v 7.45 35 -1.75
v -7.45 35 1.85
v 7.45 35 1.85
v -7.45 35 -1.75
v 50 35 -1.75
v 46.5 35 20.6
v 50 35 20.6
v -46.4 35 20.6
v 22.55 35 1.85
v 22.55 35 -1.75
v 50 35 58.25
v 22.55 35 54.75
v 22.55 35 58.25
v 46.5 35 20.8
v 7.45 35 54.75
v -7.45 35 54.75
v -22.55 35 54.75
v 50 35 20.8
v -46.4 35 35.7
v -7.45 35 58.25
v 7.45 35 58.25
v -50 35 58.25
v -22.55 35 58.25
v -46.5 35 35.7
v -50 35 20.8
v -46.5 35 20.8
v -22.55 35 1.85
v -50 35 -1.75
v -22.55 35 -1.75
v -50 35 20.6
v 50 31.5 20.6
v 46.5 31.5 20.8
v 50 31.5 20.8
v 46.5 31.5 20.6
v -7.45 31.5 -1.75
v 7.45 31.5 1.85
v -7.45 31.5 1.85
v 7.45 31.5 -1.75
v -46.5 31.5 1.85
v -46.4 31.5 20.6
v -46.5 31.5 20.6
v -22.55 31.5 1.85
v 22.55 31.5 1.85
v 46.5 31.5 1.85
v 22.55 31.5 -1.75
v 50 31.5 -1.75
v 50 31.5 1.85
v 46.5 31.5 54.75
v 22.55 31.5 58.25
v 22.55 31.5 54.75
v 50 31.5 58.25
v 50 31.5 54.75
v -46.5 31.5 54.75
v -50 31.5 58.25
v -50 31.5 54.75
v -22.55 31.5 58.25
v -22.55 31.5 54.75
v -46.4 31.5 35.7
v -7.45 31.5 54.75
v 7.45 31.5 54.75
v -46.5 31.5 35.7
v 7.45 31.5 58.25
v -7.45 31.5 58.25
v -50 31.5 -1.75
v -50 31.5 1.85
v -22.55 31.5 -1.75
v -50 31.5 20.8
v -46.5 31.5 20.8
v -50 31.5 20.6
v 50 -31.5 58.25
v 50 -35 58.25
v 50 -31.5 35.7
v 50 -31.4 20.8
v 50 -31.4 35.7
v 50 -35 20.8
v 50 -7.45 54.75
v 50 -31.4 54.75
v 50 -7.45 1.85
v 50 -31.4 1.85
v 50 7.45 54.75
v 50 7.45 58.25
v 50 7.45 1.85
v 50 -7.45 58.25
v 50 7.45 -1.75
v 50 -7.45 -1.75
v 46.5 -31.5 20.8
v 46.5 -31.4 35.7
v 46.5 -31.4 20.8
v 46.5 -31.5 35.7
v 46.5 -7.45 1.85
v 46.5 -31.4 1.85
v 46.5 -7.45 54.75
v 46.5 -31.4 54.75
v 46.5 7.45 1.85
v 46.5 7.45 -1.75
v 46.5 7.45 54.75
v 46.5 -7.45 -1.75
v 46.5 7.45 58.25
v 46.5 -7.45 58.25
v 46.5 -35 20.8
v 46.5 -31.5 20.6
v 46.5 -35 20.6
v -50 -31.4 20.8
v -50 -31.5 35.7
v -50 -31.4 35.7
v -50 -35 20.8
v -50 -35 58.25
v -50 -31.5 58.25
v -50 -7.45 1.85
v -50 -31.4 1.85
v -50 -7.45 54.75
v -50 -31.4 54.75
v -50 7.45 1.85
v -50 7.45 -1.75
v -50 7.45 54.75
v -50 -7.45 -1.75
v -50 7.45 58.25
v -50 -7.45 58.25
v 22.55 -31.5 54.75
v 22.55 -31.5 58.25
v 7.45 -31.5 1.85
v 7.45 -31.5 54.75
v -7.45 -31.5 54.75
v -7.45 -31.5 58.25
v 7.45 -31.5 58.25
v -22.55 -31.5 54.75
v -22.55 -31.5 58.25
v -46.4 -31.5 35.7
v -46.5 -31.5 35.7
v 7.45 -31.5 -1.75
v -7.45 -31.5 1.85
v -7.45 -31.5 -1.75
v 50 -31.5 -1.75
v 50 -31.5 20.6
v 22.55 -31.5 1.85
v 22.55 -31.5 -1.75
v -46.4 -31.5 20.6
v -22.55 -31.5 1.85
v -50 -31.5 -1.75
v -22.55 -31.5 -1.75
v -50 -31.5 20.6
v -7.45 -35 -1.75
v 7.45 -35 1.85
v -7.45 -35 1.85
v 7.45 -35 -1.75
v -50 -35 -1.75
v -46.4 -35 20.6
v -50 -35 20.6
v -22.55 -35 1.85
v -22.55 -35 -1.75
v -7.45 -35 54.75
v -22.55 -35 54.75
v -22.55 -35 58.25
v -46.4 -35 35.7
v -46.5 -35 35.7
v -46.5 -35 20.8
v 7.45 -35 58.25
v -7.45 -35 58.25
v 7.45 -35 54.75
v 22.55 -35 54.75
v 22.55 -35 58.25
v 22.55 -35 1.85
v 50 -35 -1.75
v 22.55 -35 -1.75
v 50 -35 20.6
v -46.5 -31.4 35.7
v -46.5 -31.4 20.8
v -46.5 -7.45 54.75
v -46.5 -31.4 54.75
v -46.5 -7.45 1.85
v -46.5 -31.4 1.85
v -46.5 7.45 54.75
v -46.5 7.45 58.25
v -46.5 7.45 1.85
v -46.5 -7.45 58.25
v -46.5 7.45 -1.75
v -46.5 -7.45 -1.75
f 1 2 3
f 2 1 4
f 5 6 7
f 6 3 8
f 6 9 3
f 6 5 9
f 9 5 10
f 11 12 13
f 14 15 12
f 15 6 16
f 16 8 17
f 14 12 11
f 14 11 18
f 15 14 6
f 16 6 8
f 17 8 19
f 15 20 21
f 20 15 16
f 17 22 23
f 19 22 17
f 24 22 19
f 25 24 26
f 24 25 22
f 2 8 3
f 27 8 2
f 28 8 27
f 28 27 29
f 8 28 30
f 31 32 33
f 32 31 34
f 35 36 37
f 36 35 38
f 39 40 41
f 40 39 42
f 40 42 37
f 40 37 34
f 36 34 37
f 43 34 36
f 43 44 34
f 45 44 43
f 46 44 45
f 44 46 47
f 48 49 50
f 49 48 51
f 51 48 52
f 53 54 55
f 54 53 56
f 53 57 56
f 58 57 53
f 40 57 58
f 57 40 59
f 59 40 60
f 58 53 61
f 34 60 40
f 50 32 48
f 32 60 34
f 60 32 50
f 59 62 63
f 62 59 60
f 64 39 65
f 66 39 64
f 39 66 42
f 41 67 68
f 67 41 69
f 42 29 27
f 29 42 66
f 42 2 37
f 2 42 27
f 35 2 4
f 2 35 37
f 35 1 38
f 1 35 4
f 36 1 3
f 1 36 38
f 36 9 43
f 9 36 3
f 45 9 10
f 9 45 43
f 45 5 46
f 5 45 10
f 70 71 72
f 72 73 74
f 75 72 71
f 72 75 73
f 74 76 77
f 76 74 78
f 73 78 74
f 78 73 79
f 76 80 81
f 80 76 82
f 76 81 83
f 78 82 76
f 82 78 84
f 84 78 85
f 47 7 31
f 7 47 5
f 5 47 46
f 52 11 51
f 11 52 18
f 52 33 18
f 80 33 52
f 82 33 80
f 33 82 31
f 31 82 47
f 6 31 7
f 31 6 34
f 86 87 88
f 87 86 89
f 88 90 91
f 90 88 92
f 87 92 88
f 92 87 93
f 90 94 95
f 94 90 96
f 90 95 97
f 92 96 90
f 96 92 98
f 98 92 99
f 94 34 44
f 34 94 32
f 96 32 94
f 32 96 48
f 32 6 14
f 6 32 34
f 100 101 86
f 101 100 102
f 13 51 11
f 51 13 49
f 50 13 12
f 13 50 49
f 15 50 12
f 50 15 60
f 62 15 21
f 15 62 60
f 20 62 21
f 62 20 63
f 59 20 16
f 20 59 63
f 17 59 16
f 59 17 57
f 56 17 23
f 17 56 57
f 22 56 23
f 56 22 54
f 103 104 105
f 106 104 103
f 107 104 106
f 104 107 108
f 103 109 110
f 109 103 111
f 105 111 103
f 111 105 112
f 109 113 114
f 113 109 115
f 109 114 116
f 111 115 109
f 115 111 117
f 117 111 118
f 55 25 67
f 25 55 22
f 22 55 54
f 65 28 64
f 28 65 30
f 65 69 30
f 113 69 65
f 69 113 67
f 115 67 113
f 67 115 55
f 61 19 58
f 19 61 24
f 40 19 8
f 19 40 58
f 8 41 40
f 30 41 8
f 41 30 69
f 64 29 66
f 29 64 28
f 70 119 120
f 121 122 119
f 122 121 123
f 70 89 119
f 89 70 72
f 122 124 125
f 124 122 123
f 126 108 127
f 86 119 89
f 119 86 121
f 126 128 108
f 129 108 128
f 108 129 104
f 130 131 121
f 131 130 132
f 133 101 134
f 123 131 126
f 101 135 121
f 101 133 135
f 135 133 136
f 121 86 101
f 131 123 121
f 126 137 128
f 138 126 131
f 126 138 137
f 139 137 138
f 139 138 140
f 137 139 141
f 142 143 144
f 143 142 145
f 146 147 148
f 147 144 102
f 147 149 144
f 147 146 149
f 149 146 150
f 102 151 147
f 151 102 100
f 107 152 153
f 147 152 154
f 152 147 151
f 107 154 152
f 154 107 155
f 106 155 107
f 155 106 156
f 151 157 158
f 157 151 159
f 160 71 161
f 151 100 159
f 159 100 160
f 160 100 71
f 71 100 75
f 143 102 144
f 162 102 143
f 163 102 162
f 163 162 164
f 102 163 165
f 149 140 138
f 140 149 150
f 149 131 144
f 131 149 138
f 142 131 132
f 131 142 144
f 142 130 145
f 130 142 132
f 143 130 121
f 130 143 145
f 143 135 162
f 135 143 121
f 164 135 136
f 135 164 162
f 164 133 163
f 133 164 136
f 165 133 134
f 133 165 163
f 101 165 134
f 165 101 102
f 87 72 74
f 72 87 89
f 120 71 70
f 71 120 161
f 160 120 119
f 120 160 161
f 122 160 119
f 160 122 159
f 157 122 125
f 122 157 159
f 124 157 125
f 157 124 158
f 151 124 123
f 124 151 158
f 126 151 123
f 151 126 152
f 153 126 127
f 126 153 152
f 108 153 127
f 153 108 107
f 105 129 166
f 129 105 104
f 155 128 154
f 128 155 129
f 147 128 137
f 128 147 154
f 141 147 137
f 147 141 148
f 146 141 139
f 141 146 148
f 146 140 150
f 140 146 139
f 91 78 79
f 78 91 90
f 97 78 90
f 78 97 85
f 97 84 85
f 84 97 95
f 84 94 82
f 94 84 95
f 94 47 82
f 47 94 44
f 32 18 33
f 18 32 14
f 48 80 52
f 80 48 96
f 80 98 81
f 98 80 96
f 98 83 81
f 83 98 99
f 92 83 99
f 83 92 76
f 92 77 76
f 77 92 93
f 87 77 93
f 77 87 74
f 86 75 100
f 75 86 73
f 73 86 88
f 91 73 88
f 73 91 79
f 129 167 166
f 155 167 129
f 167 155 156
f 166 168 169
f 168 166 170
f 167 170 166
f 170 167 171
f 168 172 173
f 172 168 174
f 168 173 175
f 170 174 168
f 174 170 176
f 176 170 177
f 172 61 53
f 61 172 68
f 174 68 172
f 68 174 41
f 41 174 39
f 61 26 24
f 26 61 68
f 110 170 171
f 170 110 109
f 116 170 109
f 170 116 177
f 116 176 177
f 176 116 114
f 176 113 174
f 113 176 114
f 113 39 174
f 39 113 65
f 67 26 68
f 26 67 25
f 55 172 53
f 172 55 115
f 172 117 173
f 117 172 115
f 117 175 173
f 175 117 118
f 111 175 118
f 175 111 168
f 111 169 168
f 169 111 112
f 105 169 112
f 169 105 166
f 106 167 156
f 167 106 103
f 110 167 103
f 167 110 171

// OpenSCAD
//Create a laser cut box with notches
//version 2.0

/* [Box OUTSIDE Dimensions] */
//Box Width
//Box Width (X), Depth (Y), Height (Z)
bX=100;
bY=70;
bZ=60;
//Material Thickness
cutD=3.5;
lid=false;
lid=true;

/* [Tabs and Cuts] */
//Slot and Tab width
cutW=15;
//cutW=cutD*2;
//Laser kerf 
//#FIXME!  the kerf on several faces is not handeled well
//try a value of 7
kerf=.1;

/* [Layout] */
//separation of finished pieces
separation=1;

/* [Hidden] */
//Calculate the maximum number of tabs and slots
maxDivX=floor(bX/cutW);
maxDivY=floor(bY/cutW);
maxDivZ=floor(bZ/cutW);

//calculate the maximum number of usable divisions 

//NB! the maximum usable divisions MUST be odd
uDivX= (maxDivX%2)==0 ? maxDivX-3 : maxDivX-2;
uDivY= (maxDivY%2)==0 ? maxDivY-3 : maxDivY-2;
uDivZ= (maxDivZ%2)==0 ? maxDivZ-3 : maxDivZ-2;


module insideCuts(len, uDiv) {
  numTabs=floor(uDiv/2);
  numSlots=ceil(uDiv/2);
  
  //draw out rectangels for slots
  for (i=[0:numSlots-1]) {
    translate([i*(cutW*2), 0, 0])
      square([cutW+kerf, cutD+kerf]);
  }
}

module outsideCuts(len, uDiv, endCut) {
  numTabs=ceil(uDiv/2);
  numSlots=floor(uDiv/2);
  //padding - shift all the slots by the amount equal to the end cut plus one division
  padding=endCut+cutW;
   
  //first endcut
  square([endCut+kerf, cutD+kerf]);
  
  //draw all the normal slots plus the last endcut
  for (i=[0:numSlots]) {
    if (i < numSlots) {
      translate([i*(cutW*2)+padding, 0, 0])
        square([cutW+kerf, cutD+kerf]);
    } else {
      translate([i*(cutW*2)+padding, 0, 0])
        square([endCut+kerf, cutD+kerf]);
    }

  }

  
  //draw out rectangles for slots
}

//face A (X, Z)

//FIXME - check the tab alignment on the X axis! @108 the center tab might be fucked
module faceA() {
  difference() {
    square([bX, bZ], center=true);
    //X+/- edge (X axis in OpenSCAD)
    if (lid) {
    translate([-uDivX*cutW/2-kerf/2, bZ/2-cutD, 0])
      insideCuts(bX, uDivX);
    }
    translate([-uDivX*cutW/2-kerf/2, -bZ/2, 0])
      insideCuts(bX, uDivX);

    //Z+/- edge (Y axis in OpenSCAD)
    translate([bX/2-cutD, uDivZ*cutW/2-kerf/2, 0]) rotate([0, 0, -90])
      insideCuts(bZ, uDivZ);
    translate([-bX/2, uDivZ*cutW/2-kerf/2, 0]) rotate([0, 0, -90])
      insideCuts(bZ, uDivZ);
  }
} //end faceA


//#FIXME kerf on X and Y edges are wrong; 
module faceB() {
  endCutX=(bX-uDivX*cutW)/2;
  difference() {
    square([bX, bY], center=true);
    //X+/- edge (X axis in OpenSCAD)
    translate([(-uDivX*cutW/2)-endCutX-kerf/2, bY/2-cutD, 0])
      outsideCuts(bX, uDivX, endCutX);
    translate([(-uDivX*cutW/2)-endCutX-kerf/2, -bY/2, 0])
      outsideCuts(bX, uDivX, endCutX);

    //Y+/- edge (Y axis in OpenSCAD)
    #translate([bX/2-cutD, uDivY*cutW/2, 0]) rotate([0, 0, -90])
      insideCuts(bY, uDivY);
    #translate([-bX/2, uDivY*cutW/2, 0]) rotate([0, 0, -90])
      insideCuts(bY, uDivY);
      
  }
}

module faceC() {
  endCutY=(bY-uDivY*cutW)/2;
  endCutZ=(bZ-uDivZ*cutW)/2;

  difference() {
    square([bY, bZ], center=true);
    //Y+/- edge (X axis in OpenSCAD)
    if (lid) {
    translate([(-uDivY*cutW/2)-endCutY-kerf/2, bZ/2-cutD, 0])
      outsideCuts(bY, uDivY, endCutY);
    }
    translate([(-uDivY*cutW/2)-endCutY-kerf/2, -bZ/2, 0])
      outsideCuts(bY, uDivY, endCutY);

    //Z+/- edge (Y axis in OpenSCAD)
    translate([-bY/2, (uDivZ*cutW/2)+endCutZ+kerf/2, 0]) rotate([0, 0, -90])
      outsideCuts(bZ, uDivZ, endCutZ);
    translate([bY/2-cutD, (uDivZ*cutW/2)+endCutZ+kerf/2, 0]) rotate([0, 0, -90])
      outsideCuts(bZ, uDivZ, endCutZ);
  }
}

module layout2D() {
  faceA();
  translate([0, -bZ/2-bY/2-separation, 0])
    color("green") faceB();
  translate([bX/2+bY/2+separation, 0, 0])  
    color("blue") faceC();
}

module assemble3D() {
  //amount to shift for cut depth
  D=cutD/2;

  //transparency
  alp=0.5;

  
  color("aqua", alpha=alp) 
    linear_extrude(height=cutD, center=true) faceB();
  if (lid) {  
  color("green", alpha=alp) 
    translate([0, 0, bZ-cutD])
    linear_extrude(height=cutD, center=true) faceB();
  }

  //faceA +/-
  color("red", alpha=alp)  
    translate([0, bY/2-D, bZ/2-D]) rotate([90, 0, 0])
    linear_extrude(height=cutD, center=true) faceA();
  color("gold", alpha=alp)
    translate([0, -bY/2+D, bZ/2-D]) rotate([90, 0, 0])
    linear_extrude(height=cutD, center=true) faceA();

  //FaceC +/-
  color("blue", alpha=alp)
    translate([bX/2-D, 0, bZ/2-D]) rotate([90, 0, 90])
    linear_extrude(height=cutD, center=true) faceC();
  color("silver", alpha=alp)
    translate([-bX/2+D, 0, bZ/2-D]) rotate([90, 0, 90])
    linear_extrude(height=cutD, center=true) faceC();
}

*layout2D();
*translate([bX+bY+separation*2, 0, 0])  
  layout2D();

assemble3D();
